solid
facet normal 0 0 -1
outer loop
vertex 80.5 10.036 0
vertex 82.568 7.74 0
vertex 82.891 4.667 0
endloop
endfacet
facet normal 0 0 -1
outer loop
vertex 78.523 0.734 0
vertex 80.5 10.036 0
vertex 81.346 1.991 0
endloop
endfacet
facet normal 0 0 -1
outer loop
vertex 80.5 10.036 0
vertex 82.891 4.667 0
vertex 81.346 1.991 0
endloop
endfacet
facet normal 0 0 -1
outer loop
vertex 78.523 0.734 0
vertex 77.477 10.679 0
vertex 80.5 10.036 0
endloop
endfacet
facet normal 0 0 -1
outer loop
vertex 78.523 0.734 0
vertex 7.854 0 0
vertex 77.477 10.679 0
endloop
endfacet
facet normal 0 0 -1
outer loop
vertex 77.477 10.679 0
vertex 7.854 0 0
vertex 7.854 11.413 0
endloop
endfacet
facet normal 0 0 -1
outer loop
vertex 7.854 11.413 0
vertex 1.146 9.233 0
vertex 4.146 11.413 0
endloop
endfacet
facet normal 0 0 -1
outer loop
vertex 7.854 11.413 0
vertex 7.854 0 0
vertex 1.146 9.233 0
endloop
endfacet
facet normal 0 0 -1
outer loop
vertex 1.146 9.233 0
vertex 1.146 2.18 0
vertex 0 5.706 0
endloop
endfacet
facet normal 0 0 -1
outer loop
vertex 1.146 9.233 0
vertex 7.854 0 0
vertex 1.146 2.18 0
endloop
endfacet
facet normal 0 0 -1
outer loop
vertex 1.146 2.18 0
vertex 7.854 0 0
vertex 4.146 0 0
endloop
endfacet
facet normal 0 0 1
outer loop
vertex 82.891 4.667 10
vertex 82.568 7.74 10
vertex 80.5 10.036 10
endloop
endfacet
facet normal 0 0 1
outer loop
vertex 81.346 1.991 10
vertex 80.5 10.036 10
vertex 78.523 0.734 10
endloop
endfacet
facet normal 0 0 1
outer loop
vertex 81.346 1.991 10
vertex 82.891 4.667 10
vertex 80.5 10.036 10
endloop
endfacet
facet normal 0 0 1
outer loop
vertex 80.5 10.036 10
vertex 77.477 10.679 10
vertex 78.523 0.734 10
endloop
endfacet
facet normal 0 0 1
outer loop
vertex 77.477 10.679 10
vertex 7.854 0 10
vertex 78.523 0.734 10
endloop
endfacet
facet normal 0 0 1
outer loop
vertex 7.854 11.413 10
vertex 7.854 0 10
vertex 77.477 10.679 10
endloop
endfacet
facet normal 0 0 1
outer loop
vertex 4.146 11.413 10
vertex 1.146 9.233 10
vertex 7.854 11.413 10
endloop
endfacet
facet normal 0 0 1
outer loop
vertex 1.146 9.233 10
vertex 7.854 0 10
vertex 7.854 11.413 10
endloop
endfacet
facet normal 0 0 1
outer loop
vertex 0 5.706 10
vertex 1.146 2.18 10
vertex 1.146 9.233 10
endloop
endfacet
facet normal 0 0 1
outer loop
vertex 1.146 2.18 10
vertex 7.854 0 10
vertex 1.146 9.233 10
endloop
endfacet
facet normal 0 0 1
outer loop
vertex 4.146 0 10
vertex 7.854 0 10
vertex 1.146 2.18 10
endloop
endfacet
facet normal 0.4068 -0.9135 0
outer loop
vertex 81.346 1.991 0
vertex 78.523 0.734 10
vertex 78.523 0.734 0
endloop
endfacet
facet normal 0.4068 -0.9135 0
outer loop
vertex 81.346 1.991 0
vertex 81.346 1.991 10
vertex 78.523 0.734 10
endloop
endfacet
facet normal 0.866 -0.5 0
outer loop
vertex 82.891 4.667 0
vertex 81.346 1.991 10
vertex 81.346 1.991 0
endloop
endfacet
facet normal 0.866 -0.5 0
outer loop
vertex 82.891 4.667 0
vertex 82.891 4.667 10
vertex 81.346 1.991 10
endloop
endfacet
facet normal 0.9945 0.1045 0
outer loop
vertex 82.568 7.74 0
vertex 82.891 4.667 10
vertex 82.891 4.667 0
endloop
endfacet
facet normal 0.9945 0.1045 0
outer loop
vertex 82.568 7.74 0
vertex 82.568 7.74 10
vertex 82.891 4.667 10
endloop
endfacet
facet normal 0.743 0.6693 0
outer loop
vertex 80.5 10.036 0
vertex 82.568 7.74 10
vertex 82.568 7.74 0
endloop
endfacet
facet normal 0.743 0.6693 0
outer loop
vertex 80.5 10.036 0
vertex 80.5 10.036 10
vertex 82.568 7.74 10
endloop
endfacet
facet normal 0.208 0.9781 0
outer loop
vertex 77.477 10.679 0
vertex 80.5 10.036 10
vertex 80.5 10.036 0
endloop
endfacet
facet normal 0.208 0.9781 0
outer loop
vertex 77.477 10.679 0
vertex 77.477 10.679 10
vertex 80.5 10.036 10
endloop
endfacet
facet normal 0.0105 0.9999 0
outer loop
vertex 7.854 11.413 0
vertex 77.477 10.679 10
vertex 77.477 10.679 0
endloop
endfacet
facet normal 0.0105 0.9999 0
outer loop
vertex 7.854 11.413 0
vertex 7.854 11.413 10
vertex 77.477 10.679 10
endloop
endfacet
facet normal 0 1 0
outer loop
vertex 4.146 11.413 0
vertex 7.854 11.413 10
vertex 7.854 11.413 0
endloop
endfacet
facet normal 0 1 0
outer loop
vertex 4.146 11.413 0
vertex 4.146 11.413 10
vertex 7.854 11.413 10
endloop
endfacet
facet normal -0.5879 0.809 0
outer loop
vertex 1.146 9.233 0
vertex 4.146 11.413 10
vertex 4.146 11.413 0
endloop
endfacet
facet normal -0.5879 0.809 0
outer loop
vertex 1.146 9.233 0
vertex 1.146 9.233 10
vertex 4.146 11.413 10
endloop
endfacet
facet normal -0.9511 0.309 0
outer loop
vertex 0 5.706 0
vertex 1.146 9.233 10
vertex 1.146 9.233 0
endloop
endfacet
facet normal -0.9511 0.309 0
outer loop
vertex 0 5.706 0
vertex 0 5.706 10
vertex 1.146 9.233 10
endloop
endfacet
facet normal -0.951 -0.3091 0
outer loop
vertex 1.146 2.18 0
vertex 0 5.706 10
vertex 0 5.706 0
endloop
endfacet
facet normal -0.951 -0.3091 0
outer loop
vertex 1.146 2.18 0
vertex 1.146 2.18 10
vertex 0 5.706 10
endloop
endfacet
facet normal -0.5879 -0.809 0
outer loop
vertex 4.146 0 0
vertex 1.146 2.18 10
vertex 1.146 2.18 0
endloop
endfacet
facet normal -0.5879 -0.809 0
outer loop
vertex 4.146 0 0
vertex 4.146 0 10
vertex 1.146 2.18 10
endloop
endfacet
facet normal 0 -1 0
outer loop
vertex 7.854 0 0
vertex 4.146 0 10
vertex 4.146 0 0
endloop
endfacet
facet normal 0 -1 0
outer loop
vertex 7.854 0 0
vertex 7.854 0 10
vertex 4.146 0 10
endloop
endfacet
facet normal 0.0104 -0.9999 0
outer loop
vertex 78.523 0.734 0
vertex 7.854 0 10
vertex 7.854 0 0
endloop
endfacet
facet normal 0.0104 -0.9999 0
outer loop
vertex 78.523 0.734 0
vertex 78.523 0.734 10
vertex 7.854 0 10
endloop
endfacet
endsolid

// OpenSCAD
$fn = 32;

// ----------------------------------------------------------------------
// Lever arm: two bosses 12 and 8 mm, 45 mm between centres
// ----------------------------------------------------------------------

// --- parameters (mm) ---
profile_height = 10;      // extrusion height
profile_points = 13;      // points of the closed outline

profile = [[0, 5.706], [1.146, 2.18], [4.146, 0], [7.854, 0], [78.523, 0.734], [81.346, 1.991], [82.891, 4.667], [82.568, 7.74], [80.5, 10.036], [77.477, 10.679], [7.854, 11.413], [4.146, 11.413], [1.146, 9.233]];  // single closed polygon, 13 points, counter clockwise

// --- the one profile operation ---
linear_extrude(height = profile_height) polygon(points = profile);
